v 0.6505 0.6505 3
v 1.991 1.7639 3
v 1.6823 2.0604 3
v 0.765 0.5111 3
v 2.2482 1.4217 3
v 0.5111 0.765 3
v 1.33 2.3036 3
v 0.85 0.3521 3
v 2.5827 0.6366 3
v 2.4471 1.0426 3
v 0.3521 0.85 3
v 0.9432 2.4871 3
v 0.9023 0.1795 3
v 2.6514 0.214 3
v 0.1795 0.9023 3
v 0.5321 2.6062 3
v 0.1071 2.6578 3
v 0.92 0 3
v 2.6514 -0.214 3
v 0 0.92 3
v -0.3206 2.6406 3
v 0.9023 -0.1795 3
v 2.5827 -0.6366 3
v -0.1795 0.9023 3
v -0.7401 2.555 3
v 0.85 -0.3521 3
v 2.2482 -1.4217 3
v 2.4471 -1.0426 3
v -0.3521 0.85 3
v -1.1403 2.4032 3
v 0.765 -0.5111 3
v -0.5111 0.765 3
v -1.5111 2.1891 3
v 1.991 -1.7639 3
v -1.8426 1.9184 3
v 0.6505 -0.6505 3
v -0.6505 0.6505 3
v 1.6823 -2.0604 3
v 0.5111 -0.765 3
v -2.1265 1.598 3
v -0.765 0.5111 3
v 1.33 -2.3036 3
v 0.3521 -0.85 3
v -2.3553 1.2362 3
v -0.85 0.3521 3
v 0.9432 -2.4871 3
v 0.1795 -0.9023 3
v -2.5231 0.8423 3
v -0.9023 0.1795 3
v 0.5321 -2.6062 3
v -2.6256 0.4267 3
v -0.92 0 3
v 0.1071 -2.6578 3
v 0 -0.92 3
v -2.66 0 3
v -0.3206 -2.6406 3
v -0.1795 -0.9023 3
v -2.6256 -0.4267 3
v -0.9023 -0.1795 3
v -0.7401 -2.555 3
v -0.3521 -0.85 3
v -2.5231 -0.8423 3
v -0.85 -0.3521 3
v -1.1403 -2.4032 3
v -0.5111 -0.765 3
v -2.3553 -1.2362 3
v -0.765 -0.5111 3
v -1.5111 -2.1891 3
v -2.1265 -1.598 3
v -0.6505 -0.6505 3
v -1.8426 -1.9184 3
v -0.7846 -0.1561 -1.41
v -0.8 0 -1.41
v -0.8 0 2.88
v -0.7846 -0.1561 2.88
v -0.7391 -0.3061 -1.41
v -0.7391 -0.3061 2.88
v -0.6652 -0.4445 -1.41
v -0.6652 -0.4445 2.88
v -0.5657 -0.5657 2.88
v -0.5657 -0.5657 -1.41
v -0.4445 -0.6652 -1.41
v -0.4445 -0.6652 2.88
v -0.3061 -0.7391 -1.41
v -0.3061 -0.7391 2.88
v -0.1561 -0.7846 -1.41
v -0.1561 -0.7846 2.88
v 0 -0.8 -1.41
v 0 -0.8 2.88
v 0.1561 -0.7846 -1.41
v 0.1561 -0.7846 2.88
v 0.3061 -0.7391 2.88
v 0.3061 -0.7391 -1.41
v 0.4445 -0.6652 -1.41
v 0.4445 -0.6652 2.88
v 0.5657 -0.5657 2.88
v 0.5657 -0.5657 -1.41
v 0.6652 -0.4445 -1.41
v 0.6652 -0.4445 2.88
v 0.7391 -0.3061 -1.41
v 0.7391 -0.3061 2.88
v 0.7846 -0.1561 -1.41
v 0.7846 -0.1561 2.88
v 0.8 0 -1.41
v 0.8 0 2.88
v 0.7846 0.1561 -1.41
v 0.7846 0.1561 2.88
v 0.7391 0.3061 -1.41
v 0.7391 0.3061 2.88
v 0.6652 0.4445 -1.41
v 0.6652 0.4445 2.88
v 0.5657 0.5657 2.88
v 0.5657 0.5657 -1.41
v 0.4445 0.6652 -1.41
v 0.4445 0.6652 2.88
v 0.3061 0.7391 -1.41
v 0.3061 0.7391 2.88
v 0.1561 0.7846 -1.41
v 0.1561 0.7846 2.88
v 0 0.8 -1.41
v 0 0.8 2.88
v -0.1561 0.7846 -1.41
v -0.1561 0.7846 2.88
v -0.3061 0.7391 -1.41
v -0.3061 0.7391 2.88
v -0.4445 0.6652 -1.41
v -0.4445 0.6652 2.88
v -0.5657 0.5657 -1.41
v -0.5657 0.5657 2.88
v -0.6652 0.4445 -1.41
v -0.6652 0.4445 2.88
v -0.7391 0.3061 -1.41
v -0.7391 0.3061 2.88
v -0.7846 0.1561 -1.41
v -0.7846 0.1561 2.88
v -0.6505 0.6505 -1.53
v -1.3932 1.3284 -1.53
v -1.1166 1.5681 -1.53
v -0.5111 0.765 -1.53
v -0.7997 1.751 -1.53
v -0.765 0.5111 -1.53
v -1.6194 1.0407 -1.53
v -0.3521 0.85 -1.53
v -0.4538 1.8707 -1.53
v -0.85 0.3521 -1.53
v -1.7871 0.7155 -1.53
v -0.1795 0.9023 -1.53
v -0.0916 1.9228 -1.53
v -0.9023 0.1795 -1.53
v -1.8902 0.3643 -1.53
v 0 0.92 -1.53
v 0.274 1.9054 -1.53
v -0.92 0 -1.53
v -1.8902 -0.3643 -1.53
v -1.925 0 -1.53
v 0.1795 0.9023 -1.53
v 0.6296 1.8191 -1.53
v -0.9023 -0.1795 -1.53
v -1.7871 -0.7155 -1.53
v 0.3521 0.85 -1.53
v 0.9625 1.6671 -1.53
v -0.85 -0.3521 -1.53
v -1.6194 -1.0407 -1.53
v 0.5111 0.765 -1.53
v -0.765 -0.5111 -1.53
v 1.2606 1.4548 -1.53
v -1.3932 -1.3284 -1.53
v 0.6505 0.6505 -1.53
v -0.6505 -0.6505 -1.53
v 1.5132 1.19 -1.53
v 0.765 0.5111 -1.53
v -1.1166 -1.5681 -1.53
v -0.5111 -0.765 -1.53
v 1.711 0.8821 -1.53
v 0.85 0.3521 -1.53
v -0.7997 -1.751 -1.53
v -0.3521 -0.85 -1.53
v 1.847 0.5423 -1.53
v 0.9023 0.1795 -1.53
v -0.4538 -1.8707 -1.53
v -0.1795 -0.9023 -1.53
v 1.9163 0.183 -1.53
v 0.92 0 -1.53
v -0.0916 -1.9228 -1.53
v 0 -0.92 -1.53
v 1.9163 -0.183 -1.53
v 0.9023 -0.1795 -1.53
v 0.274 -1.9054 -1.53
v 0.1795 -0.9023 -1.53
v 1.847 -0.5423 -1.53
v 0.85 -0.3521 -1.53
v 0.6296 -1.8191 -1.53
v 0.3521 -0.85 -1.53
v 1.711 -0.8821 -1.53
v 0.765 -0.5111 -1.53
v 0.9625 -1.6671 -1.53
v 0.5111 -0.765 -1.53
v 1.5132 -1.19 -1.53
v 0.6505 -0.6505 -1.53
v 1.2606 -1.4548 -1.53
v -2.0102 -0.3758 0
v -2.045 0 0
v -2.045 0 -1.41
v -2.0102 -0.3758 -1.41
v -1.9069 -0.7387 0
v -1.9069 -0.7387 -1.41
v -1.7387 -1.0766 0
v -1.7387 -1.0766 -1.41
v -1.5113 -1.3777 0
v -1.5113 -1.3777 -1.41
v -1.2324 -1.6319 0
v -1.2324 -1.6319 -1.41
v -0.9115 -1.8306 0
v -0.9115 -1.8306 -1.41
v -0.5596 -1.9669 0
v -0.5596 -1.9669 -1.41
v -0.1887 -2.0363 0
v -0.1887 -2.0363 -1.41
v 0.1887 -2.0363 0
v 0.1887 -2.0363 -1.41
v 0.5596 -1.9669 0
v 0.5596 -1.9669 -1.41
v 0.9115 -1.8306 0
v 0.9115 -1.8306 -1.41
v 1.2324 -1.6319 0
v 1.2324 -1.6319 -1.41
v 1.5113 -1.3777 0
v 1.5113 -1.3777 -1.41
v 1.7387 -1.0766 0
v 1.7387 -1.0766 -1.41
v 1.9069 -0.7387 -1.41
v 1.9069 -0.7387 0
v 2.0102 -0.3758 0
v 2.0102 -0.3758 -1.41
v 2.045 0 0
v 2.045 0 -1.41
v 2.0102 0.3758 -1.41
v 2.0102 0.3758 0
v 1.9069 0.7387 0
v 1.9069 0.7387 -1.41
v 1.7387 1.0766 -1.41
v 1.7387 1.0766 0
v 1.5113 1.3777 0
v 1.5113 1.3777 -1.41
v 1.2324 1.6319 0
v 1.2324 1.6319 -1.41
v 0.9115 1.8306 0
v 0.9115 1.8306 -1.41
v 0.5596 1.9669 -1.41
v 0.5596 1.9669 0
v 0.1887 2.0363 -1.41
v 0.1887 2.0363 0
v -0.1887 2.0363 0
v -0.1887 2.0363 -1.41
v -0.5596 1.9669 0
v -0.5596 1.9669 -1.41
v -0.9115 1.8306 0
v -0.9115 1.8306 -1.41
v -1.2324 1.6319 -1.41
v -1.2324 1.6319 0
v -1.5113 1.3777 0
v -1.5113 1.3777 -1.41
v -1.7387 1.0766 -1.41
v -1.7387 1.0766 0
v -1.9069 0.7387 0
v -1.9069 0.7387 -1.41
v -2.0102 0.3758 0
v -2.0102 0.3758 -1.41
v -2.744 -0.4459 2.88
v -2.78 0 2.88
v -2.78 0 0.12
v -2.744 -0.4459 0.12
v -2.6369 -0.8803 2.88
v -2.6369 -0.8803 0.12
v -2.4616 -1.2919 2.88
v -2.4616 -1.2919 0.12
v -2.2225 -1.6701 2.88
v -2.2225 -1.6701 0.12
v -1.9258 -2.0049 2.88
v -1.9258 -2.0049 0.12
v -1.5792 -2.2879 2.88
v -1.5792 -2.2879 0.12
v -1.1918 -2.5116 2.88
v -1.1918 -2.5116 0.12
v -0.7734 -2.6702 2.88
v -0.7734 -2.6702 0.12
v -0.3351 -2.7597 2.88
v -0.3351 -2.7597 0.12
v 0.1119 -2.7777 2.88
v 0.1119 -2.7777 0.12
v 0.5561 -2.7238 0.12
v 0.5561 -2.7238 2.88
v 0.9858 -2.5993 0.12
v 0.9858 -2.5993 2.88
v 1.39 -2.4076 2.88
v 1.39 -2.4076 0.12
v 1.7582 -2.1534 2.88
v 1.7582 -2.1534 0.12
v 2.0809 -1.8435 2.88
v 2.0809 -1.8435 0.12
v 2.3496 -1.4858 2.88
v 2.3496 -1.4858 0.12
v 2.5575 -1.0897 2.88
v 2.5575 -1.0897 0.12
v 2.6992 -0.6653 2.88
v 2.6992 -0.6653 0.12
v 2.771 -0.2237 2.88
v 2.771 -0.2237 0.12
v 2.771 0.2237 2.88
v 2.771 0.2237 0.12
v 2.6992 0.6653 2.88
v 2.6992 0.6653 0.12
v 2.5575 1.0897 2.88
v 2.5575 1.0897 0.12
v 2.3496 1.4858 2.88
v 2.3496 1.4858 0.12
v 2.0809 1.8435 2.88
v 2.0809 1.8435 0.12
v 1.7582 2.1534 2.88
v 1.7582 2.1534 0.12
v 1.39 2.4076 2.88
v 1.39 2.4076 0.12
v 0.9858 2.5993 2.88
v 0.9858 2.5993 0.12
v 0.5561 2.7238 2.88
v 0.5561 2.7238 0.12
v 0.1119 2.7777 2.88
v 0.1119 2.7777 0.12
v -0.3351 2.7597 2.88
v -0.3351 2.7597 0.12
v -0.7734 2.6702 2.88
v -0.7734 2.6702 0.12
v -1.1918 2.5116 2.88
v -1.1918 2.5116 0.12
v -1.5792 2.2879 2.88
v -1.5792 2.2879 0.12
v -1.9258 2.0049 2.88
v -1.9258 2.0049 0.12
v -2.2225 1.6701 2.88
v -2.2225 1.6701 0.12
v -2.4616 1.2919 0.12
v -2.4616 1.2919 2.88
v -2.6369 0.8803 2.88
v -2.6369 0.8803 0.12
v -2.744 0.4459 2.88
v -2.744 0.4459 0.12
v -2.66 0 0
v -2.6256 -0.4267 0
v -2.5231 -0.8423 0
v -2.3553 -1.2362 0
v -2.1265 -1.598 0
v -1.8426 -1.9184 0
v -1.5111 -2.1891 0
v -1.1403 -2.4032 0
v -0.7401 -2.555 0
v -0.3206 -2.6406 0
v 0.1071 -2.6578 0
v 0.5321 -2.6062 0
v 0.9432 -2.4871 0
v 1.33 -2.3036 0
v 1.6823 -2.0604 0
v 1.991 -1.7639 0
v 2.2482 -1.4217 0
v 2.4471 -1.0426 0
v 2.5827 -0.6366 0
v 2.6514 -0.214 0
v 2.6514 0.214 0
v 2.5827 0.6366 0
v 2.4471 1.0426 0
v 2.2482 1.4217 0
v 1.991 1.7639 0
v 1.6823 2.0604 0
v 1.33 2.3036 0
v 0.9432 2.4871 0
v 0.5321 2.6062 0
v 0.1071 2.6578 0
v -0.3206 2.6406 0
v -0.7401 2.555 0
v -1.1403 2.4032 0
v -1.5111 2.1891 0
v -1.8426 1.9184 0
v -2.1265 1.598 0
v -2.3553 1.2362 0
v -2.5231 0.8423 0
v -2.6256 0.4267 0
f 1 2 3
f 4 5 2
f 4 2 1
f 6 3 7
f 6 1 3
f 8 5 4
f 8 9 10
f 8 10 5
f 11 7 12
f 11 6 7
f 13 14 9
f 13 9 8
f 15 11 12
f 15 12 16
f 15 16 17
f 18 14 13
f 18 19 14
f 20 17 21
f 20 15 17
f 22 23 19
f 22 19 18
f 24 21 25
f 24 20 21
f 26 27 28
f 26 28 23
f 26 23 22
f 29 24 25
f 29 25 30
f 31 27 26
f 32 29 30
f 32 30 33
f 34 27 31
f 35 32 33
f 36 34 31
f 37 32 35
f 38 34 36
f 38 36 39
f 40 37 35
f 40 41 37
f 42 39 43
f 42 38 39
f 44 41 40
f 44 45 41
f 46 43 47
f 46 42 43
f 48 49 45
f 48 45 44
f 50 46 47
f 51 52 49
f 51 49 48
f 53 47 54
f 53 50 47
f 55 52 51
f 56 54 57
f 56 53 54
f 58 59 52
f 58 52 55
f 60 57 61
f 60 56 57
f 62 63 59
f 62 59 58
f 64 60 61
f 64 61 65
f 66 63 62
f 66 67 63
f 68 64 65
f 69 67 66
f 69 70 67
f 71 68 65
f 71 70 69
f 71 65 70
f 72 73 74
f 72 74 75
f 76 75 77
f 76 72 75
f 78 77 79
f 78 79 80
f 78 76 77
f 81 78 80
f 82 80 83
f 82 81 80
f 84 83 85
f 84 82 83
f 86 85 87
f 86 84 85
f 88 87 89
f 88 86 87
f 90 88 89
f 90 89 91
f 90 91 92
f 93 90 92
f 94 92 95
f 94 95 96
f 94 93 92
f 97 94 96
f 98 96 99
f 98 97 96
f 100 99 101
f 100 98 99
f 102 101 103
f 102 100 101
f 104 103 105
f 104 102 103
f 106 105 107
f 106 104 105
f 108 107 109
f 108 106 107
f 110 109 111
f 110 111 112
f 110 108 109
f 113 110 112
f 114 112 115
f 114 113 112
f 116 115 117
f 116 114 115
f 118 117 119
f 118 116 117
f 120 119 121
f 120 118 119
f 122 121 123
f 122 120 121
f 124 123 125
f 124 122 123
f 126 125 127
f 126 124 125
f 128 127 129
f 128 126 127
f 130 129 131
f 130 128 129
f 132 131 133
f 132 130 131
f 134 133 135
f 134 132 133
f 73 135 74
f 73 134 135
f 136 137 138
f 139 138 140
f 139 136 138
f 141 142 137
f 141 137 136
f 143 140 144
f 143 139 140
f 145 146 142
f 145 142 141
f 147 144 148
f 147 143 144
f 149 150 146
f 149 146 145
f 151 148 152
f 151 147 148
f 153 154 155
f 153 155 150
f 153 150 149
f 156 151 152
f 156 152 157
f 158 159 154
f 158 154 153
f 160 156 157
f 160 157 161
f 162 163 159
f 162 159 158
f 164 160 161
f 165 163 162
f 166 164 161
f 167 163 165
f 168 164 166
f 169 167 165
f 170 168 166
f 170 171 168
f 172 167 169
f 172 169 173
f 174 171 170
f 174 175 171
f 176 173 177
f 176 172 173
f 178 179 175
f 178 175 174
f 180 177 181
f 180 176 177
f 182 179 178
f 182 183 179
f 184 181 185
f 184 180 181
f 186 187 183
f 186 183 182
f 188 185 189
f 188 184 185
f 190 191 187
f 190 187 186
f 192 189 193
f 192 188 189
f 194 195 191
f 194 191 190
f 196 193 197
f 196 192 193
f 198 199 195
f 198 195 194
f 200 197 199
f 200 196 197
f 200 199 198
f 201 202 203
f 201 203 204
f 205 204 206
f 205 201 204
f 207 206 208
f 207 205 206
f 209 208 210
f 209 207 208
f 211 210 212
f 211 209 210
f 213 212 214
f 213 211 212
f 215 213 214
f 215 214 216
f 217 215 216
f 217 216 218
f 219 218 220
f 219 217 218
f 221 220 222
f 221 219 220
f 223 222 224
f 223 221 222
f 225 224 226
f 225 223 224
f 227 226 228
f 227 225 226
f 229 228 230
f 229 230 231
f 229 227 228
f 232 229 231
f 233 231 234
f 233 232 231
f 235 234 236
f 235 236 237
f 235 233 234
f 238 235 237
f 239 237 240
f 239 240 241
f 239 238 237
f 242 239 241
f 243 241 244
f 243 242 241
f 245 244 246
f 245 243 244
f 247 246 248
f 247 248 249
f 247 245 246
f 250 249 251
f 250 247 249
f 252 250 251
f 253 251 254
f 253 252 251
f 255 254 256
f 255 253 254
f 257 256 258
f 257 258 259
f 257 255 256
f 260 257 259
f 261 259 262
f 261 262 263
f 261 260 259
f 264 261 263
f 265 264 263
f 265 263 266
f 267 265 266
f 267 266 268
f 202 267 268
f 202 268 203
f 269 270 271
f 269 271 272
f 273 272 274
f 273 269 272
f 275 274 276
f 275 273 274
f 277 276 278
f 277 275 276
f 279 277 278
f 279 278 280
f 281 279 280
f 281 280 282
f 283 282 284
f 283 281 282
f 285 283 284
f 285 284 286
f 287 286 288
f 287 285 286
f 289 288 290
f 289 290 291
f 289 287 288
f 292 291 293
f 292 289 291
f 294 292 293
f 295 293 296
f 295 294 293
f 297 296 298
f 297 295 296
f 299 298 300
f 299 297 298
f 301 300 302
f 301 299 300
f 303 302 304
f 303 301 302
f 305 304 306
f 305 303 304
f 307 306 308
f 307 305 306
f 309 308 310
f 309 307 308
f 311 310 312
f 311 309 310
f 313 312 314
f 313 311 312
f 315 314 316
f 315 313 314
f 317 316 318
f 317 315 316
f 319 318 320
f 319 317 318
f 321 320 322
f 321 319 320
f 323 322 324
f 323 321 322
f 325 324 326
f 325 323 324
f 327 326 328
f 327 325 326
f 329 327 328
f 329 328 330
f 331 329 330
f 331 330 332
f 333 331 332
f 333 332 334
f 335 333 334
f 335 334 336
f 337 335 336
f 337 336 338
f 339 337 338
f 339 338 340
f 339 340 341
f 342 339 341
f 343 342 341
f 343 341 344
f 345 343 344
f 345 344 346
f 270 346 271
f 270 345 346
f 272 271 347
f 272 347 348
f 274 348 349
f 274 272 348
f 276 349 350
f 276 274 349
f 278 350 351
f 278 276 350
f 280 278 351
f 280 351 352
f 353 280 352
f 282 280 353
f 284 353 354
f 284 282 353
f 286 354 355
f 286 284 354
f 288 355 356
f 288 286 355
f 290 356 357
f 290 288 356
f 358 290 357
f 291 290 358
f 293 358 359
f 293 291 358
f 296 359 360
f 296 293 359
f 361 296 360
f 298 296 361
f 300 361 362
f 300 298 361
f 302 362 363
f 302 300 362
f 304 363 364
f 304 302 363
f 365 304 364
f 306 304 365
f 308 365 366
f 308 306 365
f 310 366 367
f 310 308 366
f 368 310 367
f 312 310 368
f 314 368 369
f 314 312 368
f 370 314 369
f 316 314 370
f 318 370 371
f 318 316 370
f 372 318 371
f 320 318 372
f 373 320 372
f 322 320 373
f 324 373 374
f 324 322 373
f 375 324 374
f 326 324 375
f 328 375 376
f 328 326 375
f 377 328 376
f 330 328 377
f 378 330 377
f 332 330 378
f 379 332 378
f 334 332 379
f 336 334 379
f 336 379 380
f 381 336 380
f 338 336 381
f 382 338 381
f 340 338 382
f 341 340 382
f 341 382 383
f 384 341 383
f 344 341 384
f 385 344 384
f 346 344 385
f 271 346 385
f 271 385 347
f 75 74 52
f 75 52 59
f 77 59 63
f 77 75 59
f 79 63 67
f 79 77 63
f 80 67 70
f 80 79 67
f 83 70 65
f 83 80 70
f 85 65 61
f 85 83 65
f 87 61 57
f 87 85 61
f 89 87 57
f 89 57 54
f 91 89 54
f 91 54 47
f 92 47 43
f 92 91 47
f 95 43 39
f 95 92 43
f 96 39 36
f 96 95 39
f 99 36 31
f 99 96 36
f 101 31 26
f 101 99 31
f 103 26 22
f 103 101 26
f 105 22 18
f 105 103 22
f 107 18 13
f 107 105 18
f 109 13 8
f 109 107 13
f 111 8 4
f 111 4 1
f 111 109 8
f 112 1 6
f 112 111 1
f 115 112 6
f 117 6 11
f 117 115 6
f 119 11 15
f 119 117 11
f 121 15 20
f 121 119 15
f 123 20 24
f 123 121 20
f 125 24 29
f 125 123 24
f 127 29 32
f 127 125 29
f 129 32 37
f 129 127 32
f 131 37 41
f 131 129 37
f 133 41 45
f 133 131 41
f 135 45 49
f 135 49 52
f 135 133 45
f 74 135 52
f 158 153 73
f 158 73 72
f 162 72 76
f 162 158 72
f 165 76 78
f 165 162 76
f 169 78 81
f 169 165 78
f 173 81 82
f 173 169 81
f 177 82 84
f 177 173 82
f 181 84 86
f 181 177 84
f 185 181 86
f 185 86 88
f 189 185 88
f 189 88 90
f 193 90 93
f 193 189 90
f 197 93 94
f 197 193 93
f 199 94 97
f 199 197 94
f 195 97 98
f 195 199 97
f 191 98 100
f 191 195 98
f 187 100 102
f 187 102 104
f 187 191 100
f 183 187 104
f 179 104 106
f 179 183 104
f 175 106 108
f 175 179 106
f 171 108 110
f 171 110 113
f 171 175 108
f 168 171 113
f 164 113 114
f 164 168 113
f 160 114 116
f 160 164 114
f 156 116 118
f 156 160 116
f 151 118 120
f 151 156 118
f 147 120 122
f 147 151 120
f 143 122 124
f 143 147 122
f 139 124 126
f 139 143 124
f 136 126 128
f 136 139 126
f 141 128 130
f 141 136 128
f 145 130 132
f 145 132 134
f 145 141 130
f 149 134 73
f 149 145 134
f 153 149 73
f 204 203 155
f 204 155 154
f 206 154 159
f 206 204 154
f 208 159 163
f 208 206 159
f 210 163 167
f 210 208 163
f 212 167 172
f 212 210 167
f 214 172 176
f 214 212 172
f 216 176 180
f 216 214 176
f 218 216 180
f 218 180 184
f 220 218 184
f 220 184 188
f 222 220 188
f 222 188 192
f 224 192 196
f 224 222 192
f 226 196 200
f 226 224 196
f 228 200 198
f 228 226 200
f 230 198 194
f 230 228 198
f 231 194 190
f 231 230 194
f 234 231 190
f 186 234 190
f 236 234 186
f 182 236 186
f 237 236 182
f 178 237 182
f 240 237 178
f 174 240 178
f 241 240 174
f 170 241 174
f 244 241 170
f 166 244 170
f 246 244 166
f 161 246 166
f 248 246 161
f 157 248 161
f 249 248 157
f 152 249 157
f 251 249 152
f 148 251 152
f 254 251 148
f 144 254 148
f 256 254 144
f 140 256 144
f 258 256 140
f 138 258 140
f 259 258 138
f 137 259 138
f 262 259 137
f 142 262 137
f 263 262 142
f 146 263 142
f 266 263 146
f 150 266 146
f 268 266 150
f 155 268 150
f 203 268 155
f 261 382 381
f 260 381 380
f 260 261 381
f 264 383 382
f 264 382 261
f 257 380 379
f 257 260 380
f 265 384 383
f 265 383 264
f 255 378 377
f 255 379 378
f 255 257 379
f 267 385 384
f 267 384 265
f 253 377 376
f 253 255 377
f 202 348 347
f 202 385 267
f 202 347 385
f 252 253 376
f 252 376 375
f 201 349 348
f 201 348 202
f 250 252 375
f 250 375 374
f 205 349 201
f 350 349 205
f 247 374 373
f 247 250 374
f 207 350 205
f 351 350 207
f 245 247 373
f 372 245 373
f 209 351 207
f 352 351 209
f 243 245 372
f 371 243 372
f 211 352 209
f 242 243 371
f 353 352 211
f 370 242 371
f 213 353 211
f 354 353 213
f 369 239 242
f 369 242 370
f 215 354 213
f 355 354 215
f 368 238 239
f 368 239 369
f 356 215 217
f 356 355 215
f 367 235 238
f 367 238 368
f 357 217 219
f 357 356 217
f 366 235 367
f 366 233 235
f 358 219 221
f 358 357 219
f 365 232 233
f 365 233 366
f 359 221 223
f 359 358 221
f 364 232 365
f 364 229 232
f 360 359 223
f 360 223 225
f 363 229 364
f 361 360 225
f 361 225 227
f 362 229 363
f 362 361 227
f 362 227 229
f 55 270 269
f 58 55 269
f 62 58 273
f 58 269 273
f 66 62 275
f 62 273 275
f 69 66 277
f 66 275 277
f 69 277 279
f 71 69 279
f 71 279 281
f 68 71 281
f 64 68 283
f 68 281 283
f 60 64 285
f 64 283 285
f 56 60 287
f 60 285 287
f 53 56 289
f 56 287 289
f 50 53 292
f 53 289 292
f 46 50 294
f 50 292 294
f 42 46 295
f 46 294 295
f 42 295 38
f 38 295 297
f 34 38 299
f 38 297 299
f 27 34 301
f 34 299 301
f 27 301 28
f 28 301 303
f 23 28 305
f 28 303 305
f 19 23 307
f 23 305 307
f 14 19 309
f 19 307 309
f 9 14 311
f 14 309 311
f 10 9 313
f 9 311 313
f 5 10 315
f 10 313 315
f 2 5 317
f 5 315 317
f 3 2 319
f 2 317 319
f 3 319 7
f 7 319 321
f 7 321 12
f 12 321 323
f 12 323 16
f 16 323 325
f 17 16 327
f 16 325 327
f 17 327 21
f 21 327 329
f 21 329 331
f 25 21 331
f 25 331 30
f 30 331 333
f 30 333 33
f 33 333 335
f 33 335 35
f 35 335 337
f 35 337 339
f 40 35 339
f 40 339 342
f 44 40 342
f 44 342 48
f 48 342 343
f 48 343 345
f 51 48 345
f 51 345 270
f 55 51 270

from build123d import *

# Parameters (mm, degrees)
CHAMFER_SIZE = 0.12


with BuildPart() as part:
    # Sketch → Revolution (revolve)
    with BuildSketch(Plane.XZ):
        Polygon((-2.78, 3), (-0.8, 3), (-0.8, -1.53), (-2.045, -1.53), (-2.045, 0), (-2.78, 0), align=None)
    revolve(axis=Axis((0, 0, 0), (0, 0, 1)))

    # Chamfer
    chamfer_edges = [part.edges().sort_by_distance(p)[0] for p in [
        (2.78, 0, 3),
        (0.8, 0, 3),
        (2.78, 0, 0),
        (2.045, 0, -1.53),
        (0.8, 0, -1.53),
    ]]
    chamfer(chamfer_edges, length=CHAMFER_SIZE)


solid = part.part
